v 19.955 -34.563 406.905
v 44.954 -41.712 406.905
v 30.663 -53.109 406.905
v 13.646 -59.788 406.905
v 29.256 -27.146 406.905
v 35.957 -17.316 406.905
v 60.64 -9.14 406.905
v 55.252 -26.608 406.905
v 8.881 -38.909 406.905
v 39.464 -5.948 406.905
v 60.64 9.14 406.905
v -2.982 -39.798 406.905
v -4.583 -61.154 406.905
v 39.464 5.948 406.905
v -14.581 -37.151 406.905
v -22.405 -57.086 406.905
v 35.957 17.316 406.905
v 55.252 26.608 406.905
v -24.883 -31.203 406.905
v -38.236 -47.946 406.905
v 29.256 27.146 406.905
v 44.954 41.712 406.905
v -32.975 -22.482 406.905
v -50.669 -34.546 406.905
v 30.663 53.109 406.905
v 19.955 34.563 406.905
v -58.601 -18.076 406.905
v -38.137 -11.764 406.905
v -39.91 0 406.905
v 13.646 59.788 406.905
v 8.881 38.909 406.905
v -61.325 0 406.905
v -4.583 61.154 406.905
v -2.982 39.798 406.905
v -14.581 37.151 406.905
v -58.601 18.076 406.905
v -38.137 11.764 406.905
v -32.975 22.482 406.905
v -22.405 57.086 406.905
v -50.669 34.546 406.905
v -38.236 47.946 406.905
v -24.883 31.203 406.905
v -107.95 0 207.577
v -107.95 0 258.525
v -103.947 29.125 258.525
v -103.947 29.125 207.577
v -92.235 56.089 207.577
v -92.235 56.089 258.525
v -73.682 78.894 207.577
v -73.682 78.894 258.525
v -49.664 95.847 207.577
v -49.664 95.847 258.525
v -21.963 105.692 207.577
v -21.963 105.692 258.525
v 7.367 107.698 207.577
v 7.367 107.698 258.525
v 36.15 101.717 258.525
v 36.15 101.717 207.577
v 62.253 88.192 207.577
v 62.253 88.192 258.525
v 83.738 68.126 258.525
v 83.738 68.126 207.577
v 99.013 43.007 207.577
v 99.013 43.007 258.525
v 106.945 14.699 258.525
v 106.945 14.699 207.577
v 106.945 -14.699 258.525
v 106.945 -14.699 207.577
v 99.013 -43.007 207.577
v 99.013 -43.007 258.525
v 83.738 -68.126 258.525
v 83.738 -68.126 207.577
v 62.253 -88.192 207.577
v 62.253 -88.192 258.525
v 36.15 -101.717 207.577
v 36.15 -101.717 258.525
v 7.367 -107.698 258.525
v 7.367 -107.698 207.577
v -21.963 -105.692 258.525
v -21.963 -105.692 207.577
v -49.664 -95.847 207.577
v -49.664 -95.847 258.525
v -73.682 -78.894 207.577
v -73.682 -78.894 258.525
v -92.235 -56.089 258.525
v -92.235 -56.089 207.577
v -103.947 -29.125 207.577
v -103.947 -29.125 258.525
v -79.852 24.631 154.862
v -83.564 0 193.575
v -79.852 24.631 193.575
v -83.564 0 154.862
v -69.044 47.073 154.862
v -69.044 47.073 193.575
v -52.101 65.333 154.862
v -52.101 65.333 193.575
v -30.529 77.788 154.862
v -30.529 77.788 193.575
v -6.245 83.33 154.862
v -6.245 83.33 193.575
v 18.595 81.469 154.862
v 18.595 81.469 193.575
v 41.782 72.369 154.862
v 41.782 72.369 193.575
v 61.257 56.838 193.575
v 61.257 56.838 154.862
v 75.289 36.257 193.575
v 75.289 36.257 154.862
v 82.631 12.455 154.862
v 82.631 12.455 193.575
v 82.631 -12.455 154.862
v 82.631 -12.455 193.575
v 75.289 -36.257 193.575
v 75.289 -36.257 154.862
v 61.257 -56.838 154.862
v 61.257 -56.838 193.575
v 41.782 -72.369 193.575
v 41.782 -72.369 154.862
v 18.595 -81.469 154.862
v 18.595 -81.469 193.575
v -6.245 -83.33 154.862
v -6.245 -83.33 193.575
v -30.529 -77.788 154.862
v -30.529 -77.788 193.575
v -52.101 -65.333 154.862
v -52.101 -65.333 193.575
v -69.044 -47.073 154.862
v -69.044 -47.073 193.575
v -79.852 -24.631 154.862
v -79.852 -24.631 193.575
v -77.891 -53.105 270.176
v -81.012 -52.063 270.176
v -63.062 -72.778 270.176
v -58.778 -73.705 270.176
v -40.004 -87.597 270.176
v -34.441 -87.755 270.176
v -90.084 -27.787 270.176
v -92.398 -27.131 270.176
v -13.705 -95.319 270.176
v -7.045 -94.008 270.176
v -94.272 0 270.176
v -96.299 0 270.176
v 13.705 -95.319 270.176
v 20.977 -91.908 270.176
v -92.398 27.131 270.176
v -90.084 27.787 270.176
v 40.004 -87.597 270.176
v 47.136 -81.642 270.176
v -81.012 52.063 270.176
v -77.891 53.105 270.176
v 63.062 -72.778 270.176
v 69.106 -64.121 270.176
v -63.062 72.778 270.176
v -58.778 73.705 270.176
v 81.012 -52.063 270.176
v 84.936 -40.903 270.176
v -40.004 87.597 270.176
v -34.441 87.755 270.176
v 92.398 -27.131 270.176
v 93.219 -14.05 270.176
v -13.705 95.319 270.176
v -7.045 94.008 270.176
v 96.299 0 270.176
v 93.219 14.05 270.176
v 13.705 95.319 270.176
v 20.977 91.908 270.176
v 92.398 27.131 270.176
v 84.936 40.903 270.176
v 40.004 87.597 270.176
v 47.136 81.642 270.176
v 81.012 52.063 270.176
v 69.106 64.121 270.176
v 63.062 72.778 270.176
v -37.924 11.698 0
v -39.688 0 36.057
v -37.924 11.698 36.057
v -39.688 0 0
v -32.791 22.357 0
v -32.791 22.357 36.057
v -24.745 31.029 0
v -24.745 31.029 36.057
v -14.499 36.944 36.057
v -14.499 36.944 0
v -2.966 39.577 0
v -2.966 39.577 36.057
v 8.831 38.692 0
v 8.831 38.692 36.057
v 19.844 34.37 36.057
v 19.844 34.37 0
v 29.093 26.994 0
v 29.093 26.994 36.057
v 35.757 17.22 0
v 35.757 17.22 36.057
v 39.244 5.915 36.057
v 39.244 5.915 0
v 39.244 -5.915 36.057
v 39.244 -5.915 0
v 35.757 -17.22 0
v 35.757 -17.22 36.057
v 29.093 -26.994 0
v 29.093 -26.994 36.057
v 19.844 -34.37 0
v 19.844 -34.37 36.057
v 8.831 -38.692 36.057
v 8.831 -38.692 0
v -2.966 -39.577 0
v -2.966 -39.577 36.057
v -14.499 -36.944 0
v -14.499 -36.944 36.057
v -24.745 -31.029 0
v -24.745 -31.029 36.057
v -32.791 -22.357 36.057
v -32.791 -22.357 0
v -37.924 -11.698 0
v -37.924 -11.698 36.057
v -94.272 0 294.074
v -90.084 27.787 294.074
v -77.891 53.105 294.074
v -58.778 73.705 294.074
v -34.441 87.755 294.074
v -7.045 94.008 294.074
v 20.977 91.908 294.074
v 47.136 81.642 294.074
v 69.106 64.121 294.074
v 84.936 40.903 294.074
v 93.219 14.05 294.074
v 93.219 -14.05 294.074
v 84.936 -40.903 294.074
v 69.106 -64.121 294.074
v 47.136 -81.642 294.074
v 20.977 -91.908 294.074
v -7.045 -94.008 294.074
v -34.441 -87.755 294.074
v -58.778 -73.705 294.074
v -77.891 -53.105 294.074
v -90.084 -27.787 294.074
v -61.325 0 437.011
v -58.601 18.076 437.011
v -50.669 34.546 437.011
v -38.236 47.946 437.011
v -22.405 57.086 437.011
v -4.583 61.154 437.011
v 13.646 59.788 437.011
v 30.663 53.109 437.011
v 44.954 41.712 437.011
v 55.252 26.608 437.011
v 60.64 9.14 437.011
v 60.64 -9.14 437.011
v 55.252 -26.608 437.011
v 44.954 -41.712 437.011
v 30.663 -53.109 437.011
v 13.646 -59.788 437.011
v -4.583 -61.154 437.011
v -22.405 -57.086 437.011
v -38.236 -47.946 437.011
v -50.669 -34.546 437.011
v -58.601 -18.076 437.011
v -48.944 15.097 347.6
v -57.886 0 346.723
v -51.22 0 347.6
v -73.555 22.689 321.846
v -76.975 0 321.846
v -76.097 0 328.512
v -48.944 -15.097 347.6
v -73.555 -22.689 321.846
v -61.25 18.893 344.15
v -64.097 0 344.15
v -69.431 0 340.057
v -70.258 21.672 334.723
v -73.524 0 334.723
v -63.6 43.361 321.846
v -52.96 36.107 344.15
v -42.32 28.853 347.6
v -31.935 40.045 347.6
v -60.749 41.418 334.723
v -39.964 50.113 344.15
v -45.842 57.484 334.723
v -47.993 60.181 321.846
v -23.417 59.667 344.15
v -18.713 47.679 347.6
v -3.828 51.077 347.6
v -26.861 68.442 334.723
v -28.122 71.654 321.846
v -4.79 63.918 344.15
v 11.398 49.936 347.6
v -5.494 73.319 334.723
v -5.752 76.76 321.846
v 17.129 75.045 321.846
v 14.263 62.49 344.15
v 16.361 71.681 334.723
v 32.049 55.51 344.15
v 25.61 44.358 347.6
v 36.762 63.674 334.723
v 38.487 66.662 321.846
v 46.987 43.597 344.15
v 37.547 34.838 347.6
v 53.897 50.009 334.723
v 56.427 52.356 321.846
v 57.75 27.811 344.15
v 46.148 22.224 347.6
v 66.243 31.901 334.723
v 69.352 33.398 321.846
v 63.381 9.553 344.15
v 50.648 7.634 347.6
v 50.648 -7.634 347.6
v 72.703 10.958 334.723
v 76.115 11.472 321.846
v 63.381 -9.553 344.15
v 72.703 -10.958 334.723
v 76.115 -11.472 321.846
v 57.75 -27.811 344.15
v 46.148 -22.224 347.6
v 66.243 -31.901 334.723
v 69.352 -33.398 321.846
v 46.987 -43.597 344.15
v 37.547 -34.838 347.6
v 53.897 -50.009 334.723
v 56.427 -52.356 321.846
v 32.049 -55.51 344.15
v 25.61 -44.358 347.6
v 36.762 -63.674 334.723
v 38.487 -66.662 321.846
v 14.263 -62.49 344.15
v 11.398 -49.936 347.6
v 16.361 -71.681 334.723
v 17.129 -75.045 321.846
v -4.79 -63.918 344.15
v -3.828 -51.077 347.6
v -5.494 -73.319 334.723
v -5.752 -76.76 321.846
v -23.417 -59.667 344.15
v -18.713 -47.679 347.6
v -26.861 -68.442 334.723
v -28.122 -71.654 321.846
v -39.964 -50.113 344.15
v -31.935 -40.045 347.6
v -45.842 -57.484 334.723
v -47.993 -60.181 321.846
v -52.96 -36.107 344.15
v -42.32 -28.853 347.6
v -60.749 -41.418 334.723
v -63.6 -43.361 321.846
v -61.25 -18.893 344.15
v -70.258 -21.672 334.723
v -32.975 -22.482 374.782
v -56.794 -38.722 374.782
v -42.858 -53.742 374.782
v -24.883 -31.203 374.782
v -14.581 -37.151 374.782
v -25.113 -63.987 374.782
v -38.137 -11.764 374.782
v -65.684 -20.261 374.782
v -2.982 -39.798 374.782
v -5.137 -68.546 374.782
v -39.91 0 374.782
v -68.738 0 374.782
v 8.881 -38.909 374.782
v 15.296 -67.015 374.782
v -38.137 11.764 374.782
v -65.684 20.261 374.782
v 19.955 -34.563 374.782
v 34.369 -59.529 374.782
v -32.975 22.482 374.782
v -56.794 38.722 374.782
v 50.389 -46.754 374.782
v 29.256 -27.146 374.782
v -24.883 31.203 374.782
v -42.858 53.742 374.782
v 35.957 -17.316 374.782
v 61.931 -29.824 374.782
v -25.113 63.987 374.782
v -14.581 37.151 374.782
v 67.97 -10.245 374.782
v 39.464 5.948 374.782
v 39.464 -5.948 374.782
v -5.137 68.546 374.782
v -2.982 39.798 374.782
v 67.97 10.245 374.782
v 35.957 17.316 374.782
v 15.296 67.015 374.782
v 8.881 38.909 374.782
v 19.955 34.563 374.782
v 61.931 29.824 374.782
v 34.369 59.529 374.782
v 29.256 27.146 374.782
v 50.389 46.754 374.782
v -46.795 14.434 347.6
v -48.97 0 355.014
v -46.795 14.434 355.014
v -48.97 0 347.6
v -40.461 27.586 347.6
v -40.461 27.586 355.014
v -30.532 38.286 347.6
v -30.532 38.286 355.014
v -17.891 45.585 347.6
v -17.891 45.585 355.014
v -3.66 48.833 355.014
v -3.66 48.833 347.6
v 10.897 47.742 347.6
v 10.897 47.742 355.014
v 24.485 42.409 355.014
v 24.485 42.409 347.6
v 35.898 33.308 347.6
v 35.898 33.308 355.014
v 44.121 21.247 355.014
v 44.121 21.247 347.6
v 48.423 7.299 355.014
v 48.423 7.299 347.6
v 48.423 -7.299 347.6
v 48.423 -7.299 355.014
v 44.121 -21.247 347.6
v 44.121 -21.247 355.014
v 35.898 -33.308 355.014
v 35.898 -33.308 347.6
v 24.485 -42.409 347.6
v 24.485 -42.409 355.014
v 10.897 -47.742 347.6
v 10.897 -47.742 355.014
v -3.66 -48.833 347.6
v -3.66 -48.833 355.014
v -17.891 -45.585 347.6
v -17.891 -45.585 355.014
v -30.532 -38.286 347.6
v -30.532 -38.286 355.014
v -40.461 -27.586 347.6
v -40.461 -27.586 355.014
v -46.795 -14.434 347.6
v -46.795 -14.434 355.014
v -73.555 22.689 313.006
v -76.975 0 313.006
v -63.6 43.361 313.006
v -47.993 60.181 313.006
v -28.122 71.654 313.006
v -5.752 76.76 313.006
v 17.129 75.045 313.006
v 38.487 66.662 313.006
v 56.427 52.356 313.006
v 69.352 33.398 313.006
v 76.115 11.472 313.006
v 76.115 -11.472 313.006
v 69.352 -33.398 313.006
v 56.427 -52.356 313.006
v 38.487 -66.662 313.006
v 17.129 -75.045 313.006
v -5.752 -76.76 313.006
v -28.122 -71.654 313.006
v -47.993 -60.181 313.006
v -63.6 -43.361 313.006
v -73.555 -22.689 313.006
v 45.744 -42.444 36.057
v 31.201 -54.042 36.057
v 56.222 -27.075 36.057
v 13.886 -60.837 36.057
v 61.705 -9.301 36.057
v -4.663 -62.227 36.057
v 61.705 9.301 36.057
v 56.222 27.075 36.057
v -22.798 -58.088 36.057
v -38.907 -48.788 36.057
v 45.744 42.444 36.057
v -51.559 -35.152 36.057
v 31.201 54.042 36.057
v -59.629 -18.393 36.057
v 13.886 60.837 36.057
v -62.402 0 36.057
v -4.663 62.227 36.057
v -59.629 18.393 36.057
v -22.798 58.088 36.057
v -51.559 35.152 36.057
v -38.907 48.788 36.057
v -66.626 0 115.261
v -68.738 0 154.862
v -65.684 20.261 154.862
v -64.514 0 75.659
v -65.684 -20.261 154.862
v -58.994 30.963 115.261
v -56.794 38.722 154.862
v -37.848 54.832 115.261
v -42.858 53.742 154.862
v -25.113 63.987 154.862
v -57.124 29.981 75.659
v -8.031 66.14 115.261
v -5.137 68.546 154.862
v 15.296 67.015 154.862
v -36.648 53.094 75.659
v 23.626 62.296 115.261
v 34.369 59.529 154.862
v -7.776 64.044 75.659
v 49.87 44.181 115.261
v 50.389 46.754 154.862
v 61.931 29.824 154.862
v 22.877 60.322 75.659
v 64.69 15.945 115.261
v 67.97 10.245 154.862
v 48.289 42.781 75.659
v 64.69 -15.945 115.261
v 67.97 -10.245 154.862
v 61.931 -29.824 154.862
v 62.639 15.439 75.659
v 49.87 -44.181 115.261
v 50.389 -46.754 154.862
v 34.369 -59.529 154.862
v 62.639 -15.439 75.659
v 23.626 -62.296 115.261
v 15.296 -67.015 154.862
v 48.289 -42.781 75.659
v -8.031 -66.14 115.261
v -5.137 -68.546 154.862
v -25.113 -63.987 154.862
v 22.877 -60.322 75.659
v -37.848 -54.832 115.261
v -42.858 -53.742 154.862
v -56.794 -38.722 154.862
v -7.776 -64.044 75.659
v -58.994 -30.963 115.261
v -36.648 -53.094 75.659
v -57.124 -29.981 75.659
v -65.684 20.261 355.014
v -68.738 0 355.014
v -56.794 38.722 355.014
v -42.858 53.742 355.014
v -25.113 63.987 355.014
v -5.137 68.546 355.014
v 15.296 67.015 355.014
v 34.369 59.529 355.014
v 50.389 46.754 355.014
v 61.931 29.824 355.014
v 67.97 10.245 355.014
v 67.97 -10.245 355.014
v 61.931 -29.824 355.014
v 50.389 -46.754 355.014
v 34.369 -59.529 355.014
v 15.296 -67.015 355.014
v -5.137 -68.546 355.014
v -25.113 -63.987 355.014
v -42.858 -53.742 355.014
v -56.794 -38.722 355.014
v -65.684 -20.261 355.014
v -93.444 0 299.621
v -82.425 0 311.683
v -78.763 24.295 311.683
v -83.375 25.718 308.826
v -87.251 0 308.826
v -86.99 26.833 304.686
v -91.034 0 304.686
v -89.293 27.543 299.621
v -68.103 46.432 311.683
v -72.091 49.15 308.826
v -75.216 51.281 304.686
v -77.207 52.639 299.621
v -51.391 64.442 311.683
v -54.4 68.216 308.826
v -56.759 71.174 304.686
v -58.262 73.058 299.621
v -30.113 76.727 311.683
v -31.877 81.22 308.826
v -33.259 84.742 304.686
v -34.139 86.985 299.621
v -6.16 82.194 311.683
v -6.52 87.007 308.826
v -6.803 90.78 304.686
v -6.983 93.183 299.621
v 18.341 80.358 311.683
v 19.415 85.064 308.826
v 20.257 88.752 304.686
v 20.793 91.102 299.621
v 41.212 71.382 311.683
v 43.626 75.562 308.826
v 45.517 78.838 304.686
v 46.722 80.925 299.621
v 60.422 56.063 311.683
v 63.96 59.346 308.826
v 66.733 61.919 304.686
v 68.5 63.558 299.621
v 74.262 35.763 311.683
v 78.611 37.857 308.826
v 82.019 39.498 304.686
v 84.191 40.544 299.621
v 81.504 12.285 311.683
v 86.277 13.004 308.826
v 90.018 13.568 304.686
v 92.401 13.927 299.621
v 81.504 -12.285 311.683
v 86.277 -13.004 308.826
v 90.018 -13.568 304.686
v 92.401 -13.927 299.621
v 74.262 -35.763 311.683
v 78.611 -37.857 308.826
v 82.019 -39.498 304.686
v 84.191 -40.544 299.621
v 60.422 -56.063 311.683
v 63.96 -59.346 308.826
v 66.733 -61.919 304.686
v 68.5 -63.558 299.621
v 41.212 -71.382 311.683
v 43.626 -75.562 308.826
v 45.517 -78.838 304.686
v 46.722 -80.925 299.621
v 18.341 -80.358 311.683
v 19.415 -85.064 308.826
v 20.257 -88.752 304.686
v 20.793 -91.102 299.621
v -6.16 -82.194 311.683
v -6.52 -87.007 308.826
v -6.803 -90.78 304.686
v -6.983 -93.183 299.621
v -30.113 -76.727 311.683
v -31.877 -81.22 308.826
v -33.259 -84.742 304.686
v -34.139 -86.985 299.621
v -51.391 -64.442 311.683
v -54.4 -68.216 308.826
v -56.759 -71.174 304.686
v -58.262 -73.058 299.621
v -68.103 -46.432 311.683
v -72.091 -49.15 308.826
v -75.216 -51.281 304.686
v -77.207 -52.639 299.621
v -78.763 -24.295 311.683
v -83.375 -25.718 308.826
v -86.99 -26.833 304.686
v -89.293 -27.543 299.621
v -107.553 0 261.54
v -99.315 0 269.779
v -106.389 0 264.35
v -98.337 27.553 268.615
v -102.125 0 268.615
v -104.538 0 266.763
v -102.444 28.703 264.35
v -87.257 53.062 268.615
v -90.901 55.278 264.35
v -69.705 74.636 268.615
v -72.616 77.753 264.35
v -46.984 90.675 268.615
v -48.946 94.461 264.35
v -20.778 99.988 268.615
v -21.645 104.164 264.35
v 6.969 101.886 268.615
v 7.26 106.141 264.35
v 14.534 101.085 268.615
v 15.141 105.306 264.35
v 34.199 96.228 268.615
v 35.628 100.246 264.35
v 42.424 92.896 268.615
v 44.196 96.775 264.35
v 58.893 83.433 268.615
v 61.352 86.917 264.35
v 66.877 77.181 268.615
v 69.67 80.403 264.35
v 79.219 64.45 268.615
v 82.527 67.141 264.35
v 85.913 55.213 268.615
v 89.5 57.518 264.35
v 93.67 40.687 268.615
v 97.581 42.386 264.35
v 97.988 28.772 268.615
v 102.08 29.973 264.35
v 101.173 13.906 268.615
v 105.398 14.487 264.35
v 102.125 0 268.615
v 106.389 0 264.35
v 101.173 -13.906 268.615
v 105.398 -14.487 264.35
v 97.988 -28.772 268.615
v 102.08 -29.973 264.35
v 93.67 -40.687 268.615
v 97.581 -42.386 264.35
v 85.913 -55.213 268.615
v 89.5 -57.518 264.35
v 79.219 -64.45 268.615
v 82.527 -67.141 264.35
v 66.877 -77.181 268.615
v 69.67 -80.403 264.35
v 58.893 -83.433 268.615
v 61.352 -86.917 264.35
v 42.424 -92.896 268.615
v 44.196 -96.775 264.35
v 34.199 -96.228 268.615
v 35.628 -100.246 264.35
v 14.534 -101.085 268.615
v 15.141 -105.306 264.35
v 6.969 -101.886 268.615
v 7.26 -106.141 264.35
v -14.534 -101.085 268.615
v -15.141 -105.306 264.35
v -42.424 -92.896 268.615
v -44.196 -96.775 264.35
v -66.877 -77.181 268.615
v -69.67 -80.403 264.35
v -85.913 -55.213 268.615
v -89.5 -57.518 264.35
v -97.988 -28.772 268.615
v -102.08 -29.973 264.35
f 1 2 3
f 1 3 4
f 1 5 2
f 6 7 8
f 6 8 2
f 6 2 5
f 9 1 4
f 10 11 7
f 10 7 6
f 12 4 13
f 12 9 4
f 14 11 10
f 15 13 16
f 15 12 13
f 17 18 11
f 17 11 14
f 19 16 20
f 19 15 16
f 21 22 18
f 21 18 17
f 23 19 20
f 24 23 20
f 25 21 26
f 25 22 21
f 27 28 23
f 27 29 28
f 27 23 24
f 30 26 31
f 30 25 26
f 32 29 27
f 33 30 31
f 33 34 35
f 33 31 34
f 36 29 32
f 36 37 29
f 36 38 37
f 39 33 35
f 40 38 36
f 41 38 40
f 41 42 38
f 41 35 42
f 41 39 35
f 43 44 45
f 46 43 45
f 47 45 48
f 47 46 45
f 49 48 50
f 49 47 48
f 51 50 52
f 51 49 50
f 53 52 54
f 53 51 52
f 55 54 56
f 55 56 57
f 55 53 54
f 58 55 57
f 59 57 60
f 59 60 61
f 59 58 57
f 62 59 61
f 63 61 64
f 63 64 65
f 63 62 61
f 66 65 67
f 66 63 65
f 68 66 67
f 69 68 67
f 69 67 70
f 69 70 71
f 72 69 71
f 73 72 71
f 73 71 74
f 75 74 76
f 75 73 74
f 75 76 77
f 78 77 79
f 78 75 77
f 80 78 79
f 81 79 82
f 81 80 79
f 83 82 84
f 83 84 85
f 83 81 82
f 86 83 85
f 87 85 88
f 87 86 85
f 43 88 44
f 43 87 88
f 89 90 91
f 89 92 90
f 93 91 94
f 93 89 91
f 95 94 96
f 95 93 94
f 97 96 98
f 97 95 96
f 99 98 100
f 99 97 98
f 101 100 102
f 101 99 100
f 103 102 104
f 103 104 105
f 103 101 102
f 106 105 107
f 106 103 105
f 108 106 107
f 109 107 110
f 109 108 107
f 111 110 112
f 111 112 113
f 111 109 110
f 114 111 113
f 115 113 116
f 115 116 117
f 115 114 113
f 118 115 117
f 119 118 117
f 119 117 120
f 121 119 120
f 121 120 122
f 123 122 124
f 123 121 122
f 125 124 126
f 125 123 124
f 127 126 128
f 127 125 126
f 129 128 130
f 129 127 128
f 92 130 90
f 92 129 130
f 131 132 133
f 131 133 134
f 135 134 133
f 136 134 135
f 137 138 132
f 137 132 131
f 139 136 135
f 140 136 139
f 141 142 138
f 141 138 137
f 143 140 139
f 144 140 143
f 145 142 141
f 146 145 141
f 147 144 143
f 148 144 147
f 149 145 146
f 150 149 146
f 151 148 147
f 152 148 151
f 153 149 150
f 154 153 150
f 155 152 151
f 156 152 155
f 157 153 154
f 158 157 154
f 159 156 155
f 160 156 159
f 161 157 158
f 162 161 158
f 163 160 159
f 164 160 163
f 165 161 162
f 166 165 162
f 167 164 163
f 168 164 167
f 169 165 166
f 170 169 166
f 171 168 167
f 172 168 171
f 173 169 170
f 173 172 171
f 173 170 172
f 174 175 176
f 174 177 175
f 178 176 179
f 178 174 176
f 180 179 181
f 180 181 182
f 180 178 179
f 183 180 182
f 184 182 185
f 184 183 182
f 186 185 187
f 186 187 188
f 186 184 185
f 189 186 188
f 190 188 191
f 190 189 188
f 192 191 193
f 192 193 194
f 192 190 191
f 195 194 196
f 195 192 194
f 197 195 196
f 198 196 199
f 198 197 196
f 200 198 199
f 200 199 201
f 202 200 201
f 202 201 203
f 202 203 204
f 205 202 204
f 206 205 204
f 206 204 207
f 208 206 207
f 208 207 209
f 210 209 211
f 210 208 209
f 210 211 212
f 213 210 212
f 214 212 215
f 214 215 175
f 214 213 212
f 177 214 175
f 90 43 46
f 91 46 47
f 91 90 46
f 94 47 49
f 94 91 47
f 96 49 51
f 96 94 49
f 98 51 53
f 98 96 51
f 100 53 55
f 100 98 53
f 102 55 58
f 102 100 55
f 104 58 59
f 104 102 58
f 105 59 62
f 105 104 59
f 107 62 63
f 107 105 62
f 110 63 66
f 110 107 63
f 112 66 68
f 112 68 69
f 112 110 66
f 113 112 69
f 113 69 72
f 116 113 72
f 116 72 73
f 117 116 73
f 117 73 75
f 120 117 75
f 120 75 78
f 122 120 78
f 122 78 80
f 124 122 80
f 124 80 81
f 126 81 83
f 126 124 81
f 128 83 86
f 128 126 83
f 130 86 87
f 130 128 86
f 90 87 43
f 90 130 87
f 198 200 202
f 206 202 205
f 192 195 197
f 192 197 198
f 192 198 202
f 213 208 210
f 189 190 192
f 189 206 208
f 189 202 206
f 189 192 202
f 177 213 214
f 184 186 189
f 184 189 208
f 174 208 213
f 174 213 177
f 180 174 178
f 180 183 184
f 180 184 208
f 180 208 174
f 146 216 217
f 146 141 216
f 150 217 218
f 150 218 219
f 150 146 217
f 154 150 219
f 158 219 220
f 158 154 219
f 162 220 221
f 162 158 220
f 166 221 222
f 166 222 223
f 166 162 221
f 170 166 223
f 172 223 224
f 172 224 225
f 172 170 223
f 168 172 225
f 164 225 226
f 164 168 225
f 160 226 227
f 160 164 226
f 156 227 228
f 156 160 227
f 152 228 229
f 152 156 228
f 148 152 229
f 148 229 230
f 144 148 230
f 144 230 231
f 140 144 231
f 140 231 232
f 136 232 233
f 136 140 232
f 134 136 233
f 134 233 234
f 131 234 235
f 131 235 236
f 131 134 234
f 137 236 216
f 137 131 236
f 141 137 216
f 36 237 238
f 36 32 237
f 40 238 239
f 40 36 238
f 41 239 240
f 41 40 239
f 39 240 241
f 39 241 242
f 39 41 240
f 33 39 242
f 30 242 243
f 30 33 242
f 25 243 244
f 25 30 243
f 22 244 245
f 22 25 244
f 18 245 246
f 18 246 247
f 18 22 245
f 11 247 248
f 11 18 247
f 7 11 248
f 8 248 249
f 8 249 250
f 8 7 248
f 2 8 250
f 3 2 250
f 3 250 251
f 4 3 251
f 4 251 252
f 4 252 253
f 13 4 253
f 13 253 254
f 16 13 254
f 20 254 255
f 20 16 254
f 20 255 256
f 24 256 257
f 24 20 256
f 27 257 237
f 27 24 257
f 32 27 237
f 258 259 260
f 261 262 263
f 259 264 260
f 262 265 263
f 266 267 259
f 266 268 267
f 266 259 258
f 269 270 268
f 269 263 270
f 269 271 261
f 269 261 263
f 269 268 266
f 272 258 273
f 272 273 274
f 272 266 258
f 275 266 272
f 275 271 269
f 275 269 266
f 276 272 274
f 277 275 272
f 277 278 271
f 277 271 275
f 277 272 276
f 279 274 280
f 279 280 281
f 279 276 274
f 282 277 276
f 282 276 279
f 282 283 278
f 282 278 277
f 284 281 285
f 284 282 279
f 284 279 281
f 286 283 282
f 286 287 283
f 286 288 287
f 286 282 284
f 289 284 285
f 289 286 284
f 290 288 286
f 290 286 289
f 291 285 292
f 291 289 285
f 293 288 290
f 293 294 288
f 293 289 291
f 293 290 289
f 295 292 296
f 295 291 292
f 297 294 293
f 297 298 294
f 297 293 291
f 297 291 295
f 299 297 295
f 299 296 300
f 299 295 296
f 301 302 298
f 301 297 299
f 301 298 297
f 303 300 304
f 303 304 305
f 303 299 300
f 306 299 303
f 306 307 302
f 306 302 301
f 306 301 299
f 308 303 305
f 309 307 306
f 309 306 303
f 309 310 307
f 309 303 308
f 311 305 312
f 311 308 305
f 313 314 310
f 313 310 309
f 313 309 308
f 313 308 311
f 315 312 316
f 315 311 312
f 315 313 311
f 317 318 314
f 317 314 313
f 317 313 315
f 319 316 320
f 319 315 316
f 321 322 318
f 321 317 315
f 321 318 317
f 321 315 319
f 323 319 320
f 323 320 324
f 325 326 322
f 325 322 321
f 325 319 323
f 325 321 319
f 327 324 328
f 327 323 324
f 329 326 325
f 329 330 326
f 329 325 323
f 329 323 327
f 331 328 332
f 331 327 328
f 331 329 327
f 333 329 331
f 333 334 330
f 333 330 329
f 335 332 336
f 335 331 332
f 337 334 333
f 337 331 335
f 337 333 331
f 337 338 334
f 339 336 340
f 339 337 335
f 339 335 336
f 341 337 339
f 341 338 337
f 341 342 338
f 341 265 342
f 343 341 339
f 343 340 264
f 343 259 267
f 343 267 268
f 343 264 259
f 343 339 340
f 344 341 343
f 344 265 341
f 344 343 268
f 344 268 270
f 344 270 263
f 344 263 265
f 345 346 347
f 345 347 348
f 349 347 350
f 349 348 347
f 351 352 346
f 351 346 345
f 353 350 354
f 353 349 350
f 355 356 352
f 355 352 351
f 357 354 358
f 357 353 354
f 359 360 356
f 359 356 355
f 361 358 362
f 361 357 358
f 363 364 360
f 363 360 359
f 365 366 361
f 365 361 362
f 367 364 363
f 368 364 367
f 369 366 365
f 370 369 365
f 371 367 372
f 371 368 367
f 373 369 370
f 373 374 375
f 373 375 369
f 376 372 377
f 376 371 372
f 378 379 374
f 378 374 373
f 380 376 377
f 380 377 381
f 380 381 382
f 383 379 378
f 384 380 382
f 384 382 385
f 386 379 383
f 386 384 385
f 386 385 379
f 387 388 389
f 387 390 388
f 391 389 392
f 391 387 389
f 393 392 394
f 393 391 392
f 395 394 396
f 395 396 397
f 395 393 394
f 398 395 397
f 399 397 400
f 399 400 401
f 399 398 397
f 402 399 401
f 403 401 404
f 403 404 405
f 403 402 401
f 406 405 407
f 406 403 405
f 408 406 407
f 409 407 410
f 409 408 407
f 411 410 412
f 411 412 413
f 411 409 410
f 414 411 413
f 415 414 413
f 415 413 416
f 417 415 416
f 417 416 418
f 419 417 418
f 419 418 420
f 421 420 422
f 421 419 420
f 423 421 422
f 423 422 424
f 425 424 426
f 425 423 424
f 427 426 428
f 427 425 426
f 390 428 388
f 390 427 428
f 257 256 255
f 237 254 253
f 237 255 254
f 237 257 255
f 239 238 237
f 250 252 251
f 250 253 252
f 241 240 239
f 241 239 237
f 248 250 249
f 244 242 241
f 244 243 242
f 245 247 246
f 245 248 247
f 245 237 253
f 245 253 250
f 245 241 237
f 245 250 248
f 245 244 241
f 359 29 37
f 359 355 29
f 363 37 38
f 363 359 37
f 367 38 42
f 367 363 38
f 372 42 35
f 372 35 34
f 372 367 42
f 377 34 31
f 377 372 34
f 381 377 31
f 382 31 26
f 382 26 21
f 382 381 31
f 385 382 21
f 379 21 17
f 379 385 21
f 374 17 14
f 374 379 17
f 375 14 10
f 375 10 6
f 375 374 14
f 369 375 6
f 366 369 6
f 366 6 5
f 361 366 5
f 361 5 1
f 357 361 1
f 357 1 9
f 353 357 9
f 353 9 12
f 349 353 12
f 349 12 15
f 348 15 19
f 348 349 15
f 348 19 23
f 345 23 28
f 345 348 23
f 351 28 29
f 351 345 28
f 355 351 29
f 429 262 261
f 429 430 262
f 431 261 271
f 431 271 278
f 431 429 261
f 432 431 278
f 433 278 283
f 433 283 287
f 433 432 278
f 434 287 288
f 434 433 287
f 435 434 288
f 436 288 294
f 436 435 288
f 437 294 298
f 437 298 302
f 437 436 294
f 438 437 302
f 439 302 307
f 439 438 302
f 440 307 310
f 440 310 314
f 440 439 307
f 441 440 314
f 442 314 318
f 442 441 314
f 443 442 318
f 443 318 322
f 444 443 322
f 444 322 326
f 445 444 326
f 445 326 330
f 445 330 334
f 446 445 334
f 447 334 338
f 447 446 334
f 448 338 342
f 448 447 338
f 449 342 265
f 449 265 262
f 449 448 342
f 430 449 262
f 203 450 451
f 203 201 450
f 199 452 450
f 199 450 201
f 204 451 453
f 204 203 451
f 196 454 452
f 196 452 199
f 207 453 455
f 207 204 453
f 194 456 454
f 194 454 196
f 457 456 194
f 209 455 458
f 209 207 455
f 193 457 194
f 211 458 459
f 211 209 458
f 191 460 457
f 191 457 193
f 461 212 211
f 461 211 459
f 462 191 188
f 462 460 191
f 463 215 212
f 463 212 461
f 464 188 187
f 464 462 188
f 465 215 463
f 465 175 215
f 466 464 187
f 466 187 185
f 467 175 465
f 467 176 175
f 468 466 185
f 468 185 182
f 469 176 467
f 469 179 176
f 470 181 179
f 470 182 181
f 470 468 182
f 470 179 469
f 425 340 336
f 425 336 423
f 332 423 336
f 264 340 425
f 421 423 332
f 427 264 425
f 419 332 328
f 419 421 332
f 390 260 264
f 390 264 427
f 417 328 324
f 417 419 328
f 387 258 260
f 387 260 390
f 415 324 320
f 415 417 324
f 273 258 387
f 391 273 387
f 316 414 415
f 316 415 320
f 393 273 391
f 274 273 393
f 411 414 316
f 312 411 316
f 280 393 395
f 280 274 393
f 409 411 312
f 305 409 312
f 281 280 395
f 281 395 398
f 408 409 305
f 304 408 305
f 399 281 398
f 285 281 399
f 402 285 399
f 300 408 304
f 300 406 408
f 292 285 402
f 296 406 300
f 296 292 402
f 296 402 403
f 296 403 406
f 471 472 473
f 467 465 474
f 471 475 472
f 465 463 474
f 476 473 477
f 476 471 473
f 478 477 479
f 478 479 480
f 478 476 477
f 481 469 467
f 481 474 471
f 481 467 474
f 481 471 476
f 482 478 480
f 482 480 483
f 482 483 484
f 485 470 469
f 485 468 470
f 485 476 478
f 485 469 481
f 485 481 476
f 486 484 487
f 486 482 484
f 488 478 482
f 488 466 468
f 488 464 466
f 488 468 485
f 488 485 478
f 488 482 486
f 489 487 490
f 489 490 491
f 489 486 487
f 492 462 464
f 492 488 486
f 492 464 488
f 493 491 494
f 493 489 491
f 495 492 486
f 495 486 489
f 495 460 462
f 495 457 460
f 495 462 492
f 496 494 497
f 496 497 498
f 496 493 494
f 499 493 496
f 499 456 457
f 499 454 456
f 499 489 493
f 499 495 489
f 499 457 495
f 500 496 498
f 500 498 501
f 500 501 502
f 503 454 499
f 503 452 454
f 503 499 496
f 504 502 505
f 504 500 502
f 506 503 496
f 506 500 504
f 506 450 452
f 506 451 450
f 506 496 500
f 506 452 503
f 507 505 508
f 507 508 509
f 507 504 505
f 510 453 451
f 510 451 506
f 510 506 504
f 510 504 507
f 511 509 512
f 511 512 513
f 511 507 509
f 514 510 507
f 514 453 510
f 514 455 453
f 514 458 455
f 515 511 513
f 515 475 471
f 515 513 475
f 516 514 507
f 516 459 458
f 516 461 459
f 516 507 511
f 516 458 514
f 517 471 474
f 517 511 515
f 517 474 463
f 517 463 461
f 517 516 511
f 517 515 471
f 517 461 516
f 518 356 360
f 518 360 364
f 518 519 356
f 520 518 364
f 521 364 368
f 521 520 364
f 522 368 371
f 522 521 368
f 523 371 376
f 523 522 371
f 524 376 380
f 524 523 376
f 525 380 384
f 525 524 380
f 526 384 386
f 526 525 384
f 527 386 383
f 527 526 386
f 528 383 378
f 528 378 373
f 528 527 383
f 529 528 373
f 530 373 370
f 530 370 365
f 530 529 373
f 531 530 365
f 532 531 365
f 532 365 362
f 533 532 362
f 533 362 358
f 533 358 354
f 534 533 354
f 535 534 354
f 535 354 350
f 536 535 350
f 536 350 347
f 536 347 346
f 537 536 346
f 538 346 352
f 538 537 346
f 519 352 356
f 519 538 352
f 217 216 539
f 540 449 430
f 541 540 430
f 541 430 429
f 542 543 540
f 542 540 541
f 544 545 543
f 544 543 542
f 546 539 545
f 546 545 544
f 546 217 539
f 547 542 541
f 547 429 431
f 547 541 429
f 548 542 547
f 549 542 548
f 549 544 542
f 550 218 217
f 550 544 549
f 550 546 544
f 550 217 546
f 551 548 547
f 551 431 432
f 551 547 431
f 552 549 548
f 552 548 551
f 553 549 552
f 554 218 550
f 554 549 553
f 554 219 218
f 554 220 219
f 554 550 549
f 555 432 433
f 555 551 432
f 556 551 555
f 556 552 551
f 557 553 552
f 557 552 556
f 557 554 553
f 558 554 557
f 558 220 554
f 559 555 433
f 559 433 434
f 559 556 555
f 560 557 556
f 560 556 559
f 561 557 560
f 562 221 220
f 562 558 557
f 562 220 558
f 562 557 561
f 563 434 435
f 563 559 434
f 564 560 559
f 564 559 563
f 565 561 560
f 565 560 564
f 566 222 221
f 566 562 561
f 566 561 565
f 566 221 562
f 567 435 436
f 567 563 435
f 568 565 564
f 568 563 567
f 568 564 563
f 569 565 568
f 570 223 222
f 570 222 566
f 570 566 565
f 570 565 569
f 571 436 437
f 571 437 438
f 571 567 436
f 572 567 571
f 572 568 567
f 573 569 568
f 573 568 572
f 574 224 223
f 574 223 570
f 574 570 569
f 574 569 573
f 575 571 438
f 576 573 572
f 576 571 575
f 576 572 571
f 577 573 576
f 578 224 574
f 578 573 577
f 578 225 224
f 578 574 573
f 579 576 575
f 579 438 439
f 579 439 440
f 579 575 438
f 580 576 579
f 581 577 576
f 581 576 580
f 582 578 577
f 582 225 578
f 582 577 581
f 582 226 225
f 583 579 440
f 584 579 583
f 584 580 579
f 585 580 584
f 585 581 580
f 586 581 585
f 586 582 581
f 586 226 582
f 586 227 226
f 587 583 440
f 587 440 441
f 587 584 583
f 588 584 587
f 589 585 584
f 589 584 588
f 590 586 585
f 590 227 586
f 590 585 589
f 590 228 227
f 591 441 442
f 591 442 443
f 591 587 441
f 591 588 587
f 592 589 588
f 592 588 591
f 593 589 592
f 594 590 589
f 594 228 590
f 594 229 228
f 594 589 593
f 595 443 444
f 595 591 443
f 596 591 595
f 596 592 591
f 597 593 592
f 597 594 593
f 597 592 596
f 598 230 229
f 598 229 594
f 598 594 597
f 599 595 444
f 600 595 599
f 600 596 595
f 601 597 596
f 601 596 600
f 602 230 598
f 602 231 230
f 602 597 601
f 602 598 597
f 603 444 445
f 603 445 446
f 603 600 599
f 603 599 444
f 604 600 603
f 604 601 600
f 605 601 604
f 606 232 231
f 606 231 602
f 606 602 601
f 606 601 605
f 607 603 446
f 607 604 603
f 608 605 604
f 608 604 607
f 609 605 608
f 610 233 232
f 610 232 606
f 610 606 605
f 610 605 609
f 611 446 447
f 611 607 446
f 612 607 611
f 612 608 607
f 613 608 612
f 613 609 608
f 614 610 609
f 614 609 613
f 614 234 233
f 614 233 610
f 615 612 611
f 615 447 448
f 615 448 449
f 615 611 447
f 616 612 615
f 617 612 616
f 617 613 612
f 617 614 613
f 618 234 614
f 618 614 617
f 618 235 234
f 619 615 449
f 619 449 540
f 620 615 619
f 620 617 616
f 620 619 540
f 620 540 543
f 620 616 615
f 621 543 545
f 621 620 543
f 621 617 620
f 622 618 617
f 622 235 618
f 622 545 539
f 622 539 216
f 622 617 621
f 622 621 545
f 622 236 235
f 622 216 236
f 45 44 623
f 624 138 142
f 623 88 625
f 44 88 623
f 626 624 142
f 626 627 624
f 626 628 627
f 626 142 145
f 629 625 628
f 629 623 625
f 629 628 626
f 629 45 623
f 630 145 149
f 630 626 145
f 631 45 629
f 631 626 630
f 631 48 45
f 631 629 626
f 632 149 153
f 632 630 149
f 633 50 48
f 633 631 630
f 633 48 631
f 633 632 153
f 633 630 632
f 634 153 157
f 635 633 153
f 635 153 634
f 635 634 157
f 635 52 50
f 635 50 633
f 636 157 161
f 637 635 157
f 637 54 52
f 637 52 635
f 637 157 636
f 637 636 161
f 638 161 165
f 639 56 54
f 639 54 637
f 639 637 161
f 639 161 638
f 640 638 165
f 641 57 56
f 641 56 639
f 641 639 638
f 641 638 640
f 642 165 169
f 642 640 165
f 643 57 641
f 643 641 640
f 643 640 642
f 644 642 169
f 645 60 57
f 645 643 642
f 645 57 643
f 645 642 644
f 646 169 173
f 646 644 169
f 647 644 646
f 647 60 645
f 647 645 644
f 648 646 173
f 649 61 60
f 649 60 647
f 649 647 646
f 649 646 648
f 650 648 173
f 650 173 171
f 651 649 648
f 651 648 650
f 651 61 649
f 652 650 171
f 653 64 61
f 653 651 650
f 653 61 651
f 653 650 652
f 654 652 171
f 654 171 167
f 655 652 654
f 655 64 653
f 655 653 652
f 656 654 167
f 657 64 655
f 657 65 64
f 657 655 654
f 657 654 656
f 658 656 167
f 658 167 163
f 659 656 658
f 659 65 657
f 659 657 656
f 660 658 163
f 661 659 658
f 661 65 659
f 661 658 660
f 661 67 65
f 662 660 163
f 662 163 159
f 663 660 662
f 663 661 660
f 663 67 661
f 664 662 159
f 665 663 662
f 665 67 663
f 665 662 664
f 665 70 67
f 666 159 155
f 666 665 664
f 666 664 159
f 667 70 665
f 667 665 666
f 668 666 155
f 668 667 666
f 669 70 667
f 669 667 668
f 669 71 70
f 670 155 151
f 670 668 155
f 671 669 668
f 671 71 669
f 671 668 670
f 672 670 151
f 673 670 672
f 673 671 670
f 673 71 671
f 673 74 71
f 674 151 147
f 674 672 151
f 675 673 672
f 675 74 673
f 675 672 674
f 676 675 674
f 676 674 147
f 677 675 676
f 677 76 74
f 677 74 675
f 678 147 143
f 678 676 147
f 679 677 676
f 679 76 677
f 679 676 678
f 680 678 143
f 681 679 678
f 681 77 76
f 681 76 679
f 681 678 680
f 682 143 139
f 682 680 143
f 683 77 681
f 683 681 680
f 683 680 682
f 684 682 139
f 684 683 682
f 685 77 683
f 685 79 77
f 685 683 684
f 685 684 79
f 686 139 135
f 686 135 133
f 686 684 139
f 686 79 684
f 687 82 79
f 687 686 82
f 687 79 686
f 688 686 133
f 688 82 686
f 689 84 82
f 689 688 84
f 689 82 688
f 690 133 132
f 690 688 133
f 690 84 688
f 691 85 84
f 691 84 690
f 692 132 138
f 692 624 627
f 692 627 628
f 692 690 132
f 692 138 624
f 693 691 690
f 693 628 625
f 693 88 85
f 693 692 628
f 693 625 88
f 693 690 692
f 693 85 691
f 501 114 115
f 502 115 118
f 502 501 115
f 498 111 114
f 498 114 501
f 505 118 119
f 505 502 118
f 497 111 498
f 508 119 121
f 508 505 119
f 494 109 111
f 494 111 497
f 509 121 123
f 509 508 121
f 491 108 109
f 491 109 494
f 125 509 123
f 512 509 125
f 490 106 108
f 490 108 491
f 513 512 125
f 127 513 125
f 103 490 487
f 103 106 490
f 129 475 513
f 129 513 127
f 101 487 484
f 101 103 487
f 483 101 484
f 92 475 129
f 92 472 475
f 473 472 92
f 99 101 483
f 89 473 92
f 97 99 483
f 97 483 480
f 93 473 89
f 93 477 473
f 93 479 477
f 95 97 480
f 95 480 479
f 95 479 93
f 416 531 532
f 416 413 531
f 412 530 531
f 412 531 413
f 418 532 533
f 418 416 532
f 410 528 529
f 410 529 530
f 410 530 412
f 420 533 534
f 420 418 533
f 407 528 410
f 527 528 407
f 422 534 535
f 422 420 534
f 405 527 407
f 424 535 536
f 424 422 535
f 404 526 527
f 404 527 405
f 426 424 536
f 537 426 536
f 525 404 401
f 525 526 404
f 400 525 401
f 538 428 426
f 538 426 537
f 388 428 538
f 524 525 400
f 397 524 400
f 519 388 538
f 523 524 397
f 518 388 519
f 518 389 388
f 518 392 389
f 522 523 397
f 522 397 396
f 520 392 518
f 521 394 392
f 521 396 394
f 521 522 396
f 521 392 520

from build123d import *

# Parameters (mm, degrees)
F2_R = 25.7548302834
F4_R = 11.650994652


# Not quite as in the source:
# - a fillet or chamfer that OpenCascade refuses, or shapes differently, is made with other operations: its cross-section is extruded or revolved along the edge and cut away or added


with BuildPart() as f1:
    # F0 (on Front) → F1 (revolve)
    with BuildSketch(Plane.XZ):
        Polygon((0, 0), (0, 437.0113793103), (-61.3251142204, 437.0113793103), (-61.3251142204, 406.9045186043), (-39.9097763002, 406.9045186043), (-39.9097763002, 374.7815191746), (-68.7381178141, 374.7815191746), (-68.7381178141, 355.0135195255), (-48.9701107144, 355.0135195255), (-48.9701107144, 347.6004898548), (-76.974786818, 347.6004898548), (-76.974786818, 313.006490469), (-94.2717939615, 313.006490469), (-94.2717939615, 270.1758146286), (-107.95, 270.1758146286), (-107.95, 207.5771391392), (-83.5641175508, 193.5748010874), (-83.5641175508, 154.8624634743), (-68.7381178141, 154.8624634743), (-62.401818486, 36.0568519682), (-39.6875, 36.0568519682), (-39.6875, 0), align=None)
    revolve(axis=Axis((0, 0, 218.5056896552), (0, 0, -1)))

    # F2
    f2_edges = [f1.edges().sort_by_distance(p)[0] for p in [
        (76.974787, 0, 347.60049),
    ]]
    fillet(f2_edges, radius=F2_R)

    # F3: fillet of radius 19.0095175901 on 1 edges, made by hand

    # F3_s1 → F3_t2 (revolve, cut)
    with BuildSketch(Plane.XZ):
        with BuildLine():
            ThreePointArc((-76.974786818, 313.006490469), (-89.296444613, 306.8962751619), (-94.2717939615, 294.0742674886))
            Line((-94.2717939615, 294.0742674886), (-94.2717939615, 313.006490469))
            Line((-94.2717939615, 313.006490469), (-76.974786818, 313.006490469))
        make_face()
    revolve(axis=Axis((0, 0, 313.006490469), (0, 0, -1)), mode=Mode.SUBTRACT)

    # F4
    f4_edges = [f1.edges().sort_by_distance(p)[0] for p in [
        (107.95, 0, 270.175815),
    ]]
    fillet(f4_edges, radius=F4_R)


solid = f1.part
